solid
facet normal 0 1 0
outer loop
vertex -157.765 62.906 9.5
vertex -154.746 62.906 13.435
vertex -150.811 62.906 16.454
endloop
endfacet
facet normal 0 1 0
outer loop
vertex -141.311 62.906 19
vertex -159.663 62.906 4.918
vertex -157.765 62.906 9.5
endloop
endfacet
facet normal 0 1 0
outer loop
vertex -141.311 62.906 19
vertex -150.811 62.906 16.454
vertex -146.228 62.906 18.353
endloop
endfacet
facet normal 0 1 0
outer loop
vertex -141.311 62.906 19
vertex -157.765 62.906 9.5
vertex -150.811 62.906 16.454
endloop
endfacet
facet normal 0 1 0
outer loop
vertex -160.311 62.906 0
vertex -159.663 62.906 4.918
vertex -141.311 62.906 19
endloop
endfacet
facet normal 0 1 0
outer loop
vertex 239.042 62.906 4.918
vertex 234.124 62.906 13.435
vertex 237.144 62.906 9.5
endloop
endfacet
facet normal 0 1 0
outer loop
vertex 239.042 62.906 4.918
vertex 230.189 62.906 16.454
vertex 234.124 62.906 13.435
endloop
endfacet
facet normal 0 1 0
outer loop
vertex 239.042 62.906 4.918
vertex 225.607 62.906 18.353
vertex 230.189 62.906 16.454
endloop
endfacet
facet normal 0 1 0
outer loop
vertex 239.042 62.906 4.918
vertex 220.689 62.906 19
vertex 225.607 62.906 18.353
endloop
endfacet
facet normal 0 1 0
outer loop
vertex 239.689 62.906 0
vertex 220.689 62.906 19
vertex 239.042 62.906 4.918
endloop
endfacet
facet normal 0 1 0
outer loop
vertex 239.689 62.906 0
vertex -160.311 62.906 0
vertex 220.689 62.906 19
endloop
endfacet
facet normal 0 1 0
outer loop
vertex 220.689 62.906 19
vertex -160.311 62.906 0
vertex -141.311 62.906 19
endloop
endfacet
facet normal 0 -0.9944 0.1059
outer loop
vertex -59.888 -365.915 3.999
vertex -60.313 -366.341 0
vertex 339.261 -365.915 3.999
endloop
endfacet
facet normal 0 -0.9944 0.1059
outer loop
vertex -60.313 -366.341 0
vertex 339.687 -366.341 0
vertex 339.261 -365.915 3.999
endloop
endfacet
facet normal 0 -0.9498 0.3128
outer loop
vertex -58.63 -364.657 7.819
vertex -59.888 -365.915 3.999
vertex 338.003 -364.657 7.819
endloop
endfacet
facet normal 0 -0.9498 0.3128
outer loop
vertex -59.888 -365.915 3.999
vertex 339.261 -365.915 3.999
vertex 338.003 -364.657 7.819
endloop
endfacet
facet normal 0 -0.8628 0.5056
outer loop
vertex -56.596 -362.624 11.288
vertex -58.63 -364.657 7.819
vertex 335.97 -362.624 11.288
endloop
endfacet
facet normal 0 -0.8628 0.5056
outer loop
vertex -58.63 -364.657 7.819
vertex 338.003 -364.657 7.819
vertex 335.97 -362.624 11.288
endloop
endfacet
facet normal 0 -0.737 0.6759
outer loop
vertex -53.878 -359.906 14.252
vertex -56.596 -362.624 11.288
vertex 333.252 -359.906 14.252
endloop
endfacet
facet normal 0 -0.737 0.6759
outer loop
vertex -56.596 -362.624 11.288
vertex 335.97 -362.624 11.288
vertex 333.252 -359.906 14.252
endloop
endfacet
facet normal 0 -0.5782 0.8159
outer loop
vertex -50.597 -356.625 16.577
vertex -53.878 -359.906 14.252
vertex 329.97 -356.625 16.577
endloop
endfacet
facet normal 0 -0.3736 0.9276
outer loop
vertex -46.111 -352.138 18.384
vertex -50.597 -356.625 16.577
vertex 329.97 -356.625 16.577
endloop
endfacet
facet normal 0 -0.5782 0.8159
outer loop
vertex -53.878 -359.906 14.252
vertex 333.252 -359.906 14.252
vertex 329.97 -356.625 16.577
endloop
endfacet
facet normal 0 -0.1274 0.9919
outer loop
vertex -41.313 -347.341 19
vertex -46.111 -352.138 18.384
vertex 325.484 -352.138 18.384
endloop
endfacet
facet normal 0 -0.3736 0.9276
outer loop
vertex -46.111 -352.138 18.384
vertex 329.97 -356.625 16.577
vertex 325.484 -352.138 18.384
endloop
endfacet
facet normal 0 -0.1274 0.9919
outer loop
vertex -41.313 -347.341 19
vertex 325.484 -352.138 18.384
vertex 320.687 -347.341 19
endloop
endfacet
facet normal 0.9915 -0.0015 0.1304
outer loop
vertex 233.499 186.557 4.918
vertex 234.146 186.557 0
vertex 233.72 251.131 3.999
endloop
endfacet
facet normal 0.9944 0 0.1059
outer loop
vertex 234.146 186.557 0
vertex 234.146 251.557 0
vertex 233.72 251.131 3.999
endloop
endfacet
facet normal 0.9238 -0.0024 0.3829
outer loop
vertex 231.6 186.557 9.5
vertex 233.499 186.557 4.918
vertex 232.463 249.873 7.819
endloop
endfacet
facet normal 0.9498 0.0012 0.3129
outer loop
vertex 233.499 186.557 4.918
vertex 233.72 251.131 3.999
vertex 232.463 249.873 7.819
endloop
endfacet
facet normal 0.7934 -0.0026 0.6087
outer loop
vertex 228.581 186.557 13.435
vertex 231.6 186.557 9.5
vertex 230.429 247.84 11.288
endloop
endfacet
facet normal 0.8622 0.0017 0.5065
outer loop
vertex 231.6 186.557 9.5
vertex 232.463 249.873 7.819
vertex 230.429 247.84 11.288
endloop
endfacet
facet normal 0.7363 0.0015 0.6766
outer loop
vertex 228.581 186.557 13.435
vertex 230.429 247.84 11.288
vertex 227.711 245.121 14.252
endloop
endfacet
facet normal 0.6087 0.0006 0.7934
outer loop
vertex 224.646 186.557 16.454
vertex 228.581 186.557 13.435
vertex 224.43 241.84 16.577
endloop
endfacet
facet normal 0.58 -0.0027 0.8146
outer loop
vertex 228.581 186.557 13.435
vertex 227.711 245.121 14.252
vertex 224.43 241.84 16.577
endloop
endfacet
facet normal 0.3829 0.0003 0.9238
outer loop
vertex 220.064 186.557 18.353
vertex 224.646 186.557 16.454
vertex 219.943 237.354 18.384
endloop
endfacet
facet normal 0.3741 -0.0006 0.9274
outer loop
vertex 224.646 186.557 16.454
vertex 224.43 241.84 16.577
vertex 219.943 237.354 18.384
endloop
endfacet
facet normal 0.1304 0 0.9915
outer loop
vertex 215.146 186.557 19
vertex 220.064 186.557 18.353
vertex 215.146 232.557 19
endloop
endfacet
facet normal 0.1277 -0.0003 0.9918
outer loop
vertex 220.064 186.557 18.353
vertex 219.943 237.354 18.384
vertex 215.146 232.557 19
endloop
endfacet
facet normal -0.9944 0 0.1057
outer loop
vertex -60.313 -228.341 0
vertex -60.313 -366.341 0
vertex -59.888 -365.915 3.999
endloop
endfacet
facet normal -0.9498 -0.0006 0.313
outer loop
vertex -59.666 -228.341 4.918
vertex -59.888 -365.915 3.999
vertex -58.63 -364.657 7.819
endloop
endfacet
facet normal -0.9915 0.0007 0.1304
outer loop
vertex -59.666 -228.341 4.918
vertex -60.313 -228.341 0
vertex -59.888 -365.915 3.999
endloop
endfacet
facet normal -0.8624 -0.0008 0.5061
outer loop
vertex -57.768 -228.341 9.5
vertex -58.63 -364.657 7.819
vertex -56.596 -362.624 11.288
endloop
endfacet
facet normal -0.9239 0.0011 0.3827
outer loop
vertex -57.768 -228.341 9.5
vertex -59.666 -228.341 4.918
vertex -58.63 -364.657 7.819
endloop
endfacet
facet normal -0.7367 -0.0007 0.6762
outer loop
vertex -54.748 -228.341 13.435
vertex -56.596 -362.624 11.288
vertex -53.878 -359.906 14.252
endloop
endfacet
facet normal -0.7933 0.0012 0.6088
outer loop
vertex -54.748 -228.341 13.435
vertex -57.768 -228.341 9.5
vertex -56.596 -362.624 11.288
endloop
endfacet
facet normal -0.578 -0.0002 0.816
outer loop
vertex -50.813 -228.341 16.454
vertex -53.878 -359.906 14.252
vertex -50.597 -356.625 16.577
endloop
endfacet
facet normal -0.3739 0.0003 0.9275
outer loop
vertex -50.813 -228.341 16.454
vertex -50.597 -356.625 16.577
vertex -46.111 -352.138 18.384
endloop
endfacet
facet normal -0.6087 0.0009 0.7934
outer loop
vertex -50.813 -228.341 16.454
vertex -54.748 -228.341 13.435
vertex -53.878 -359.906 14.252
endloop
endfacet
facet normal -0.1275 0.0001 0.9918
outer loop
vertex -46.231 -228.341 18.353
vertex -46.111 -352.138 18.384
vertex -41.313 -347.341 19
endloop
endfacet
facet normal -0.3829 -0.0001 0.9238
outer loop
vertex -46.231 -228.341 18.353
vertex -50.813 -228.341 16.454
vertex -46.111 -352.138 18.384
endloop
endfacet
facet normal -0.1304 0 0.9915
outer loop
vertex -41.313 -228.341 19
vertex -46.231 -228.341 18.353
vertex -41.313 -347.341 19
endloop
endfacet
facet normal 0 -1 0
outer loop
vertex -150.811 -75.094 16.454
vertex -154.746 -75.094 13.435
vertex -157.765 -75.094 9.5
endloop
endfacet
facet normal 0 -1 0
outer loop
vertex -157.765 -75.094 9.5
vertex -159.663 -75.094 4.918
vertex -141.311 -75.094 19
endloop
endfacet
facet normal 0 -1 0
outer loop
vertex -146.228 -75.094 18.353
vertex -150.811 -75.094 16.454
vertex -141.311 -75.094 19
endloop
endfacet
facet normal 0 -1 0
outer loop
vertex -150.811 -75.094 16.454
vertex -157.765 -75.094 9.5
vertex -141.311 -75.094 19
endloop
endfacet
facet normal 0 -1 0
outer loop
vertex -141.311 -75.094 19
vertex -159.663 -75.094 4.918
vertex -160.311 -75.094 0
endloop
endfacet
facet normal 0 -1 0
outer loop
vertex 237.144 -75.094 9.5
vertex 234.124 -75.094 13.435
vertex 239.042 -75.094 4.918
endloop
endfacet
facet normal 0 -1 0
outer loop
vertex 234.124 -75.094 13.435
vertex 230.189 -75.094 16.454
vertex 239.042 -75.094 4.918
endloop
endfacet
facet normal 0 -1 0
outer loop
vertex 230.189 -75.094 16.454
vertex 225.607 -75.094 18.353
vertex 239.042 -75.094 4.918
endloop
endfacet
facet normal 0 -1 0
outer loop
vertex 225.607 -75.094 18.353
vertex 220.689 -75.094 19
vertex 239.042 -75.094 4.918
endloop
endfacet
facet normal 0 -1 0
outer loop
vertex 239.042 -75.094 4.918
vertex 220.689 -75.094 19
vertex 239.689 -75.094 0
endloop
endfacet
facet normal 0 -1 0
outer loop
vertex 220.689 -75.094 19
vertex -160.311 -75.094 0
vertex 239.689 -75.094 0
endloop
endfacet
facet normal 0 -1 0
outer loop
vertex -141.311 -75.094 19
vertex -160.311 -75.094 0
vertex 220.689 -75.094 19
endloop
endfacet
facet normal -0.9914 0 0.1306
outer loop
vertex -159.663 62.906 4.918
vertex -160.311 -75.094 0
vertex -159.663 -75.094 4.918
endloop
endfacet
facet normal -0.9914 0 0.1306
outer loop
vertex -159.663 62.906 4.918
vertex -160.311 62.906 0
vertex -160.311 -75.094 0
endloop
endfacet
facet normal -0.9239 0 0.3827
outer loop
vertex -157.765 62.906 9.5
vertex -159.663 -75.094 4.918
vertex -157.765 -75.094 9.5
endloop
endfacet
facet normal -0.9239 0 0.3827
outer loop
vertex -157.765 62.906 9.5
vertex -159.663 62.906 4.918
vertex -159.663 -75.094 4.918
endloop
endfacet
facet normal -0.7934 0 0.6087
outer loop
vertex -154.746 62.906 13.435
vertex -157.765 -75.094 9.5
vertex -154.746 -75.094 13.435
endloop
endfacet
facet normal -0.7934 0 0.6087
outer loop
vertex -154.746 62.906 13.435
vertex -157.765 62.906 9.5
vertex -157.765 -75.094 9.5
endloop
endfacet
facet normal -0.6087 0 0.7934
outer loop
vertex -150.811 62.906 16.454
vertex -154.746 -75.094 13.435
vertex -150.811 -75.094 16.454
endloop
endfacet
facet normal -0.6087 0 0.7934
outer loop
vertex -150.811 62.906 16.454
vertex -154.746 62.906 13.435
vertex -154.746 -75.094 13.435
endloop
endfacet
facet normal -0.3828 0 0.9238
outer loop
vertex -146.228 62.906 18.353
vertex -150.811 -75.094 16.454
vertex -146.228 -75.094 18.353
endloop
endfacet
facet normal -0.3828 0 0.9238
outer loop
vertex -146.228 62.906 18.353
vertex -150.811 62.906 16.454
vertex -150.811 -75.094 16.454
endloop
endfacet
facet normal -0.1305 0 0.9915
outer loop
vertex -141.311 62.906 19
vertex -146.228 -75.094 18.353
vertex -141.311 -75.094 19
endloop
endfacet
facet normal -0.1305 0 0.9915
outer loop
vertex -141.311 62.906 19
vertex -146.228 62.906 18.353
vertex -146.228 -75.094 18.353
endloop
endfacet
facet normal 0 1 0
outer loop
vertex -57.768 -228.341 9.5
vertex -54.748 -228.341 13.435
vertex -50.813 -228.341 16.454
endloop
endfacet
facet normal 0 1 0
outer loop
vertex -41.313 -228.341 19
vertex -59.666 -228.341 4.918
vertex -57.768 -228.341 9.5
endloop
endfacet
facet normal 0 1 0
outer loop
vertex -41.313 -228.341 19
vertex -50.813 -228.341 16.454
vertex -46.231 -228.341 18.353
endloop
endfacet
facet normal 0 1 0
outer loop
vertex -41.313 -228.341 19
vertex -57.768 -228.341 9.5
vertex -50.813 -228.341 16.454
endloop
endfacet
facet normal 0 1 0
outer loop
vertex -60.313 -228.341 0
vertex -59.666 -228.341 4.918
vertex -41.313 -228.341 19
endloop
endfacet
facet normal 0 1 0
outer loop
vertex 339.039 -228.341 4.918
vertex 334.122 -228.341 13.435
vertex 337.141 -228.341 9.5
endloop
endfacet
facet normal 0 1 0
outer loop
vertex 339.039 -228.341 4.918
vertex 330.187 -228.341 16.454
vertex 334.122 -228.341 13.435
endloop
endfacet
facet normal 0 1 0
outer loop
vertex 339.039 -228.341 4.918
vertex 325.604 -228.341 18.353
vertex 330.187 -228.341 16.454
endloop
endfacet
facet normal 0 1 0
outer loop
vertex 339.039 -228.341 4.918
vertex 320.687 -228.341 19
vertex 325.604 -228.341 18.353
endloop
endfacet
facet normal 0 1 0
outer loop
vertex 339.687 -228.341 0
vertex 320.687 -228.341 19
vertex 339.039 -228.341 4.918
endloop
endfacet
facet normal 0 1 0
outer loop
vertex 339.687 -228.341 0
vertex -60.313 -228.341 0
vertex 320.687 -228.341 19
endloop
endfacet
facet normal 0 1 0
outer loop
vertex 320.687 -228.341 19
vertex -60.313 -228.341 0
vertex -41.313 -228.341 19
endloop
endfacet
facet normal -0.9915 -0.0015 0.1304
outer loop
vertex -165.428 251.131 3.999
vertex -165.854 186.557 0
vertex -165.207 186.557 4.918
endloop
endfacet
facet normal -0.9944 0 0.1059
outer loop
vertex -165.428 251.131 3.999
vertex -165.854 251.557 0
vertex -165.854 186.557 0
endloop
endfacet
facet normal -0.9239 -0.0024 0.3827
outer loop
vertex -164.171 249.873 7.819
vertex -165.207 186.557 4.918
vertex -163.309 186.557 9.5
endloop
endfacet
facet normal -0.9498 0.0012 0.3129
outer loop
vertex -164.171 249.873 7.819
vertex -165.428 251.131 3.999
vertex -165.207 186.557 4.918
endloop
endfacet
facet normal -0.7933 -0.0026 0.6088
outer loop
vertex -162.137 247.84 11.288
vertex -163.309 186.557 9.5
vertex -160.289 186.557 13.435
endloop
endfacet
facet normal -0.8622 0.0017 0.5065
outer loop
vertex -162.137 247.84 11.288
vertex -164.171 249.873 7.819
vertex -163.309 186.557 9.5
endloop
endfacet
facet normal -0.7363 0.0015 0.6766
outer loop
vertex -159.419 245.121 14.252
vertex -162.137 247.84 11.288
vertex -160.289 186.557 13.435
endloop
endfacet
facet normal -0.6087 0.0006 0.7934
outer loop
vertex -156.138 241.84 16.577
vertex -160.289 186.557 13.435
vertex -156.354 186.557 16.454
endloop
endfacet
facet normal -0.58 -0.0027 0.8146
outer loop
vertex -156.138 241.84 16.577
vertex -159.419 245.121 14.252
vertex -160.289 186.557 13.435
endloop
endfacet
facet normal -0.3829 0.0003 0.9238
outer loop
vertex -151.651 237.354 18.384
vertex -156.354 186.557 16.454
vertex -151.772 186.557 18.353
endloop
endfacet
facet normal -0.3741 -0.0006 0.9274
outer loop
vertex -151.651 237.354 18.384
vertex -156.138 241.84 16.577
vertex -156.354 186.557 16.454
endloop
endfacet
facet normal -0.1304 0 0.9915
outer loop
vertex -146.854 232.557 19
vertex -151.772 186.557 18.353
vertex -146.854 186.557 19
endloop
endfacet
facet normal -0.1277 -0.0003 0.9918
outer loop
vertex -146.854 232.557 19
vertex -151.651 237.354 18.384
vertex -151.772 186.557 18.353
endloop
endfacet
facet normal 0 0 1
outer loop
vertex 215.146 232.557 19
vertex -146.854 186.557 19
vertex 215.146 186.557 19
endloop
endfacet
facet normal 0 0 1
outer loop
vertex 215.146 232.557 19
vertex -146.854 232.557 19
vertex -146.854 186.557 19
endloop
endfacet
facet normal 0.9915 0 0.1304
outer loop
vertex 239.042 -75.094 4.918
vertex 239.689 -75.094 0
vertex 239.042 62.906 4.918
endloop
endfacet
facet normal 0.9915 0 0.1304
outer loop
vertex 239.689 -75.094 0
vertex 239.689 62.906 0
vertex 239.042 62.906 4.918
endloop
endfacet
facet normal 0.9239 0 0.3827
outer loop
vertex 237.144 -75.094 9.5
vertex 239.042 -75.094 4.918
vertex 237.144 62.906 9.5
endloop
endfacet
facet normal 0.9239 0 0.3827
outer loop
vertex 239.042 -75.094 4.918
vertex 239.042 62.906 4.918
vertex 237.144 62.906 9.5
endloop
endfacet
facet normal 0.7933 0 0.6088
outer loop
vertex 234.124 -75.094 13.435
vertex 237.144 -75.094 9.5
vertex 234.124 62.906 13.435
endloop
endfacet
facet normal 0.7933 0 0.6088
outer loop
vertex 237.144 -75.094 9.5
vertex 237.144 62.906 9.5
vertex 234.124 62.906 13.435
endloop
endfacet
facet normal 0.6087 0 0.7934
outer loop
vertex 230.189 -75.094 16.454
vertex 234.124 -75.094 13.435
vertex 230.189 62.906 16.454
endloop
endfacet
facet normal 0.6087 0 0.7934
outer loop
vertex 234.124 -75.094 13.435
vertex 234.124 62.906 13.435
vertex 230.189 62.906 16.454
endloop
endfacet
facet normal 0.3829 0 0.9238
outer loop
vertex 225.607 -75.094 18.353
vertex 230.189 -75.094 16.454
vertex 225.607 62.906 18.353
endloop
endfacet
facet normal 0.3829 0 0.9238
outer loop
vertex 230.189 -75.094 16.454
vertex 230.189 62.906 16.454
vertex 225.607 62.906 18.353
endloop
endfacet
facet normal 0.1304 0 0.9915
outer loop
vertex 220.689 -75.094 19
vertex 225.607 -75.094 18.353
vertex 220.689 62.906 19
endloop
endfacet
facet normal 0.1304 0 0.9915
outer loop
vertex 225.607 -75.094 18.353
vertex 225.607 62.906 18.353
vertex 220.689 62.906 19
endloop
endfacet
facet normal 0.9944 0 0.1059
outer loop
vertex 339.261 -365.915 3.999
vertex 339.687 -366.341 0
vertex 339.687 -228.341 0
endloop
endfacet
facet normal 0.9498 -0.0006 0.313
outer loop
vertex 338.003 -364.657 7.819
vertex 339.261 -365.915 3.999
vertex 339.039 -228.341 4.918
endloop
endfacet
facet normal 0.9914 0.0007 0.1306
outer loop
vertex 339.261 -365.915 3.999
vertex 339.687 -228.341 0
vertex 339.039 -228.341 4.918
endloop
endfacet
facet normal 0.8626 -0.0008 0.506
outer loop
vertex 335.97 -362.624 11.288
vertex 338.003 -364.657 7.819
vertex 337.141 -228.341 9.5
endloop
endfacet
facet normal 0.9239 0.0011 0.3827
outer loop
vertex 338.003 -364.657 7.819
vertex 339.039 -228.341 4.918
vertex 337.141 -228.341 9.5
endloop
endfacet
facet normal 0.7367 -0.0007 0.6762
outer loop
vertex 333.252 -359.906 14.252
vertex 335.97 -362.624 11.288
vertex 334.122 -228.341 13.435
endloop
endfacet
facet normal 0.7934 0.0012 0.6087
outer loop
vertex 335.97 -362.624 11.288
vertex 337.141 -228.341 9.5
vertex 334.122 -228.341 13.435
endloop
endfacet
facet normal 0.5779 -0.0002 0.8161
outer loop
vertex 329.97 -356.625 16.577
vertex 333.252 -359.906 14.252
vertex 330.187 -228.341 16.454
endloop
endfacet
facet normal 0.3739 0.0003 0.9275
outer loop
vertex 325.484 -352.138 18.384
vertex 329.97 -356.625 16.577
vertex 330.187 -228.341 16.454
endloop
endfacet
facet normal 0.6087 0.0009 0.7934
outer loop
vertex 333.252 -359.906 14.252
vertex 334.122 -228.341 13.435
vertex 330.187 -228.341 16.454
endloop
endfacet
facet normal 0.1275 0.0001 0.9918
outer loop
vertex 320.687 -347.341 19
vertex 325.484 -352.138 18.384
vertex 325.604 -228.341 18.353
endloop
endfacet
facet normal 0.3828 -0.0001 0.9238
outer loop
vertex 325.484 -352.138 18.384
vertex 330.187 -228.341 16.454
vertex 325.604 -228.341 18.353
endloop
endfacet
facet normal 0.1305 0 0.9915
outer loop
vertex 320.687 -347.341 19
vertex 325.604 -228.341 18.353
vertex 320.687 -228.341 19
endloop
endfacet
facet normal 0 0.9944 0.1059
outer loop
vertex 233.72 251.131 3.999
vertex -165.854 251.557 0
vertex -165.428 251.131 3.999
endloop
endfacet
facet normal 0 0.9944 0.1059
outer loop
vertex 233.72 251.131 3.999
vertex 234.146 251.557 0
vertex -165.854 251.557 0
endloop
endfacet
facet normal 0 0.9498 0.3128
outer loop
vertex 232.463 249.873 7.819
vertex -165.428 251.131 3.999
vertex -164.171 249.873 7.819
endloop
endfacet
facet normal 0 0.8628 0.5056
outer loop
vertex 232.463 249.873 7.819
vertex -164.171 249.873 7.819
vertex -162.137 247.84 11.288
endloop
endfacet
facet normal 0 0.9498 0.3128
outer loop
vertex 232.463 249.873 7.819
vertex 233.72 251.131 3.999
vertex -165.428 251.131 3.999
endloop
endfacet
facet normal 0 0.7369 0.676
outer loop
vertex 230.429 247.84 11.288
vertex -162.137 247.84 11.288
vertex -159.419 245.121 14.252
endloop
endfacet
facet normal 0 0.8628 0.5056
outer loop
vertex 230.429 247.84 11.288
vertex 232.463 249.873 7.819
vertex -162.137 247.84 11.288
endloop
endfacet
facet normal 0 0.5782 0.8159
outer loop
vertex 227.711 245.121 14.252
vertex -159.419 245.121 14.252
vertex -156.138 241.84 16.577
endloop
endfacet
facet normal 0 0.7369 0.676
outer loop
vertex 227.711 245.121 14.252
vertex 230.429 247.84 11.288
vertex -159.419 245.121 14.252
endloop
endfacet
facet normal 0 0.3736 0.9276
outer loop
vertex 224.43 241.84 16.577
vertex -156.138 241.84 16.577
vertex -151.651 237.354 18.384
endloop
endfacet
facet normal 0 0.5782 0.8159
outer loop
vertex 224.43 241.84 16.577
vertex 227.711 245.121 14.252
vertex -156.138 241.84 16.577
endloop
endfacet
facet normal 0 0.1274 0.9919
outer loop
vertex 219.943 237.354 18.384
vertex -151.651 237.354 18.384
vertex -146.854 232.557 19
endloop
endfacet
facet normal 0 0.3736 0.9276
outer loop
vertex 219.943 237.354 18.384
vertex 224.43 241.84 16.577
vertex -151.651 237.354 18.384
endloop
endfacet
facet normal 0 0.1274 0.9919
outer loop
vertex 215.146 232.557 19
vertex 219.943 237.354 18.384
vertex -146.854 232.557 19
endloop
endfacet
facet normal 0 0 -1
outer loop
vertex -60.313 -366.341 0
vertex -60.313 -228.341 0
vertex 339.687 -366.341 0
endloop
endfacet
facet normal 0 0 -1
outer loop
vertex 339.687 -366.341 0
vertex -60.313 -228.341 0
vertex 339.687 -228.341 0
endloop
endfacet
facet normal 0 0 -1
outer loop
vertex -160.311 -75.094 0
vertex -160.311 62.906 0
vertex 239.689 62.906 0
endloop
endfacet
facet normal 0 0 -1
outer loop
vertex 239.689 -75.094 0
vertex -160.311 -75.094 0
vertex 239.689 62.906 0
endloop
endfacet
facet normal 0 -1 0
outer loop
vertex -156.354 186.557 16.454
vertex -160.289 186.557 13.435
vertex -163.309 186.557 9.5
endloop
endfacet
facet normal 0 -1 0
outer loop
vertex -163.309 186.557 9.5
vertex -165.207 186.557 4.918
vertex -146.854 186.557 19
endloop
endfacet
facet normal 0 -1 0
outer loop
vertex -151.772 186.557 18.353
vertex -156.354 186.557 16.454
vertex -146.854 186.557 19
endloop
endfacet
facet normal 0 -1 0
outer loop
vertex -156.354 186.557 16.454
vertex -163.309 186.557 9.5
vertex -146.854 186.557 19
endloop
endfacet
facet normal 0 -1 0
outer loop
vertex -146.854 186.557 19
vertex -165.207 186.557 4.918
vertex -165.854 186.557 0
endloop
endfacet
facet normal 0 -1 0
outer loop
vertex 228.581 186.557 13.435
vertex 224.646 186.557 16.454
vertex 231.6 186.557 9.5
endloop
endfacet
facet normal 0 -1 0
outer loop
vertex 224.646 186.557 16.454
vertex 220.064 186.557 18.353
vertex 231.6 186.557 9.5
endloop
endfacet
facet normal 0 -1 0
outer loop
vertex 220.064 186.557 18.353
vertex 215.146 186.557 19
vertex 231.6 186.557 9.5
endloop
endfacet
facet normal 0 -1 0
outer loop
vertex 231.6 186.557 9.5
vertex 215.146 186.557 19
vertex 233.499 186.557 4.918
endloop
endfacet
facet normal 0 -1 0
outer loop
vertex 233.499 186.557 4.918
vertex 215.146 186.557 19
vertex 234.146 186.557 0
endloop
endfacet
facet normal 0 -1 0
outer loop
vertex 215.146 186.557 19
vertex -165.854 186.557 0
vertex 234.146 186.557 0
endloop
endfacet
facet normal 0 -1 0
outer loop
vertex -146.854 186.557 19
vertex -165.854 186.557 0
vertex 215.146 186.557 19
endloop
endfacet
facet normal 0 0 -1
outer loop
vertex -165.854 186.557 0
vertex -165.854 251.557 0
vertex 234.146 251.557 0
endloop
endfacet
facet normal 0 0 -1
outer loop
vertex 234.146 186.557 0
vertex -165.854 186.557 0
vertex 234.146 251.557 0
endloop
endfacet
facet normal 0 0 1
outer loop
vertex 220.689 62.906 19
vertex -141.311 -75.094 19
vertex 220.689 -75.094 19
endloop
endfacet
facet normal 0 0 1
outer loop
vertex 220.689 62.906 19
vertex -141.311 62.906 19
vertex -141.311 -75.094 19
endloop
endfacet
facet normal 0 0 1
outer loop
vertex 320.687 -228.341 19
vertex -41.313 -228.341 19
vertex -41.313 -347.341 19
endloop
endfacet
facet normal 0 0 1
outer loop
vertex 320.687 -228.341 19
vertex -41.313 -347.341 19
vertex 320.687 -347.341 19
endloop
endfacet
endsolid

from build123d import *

# Parameters (mm, degrees)
F2_W     = 400
F2_H     = 65
F3_DEPTH = 19
F0_W     = 400
F0_H     = 138
F4_DEPTH = 19
F1_W     = 400
F1_H     = 138
F5_DEPTH = 19
F6_R     = 18.99999
F6_2_R   = 18.99999
F6_3_R   = 18.99999


# Not quite as in the source:
# - a fillet or chamfer is up to 0.001 mm smaller than in the source, because OpenCascade refuses the exact size


with BuildPart() as f3:
    # F2 (on Top) → F3 (new body)
    with BuildSketch(Plane.XY):
        with Locations((34.1459533652, 219.0565094352)):
            Rectangle(F2_W, F2_H)
    extrude(amount=F3_DEPTH)

    # F6#3 (radius 19 in the source; OpenCascade refuses exactly that, so slightly less here)
    f6_3_edges = [f3.edges().sort_by_distance(p)[0] for p in [
        (234.145953, 219.056509, 19),
        (34.145953, 251.556509, 19),
        (-165.854047, 219.056509, 19),
    ]]
    fillet(f6_3_edges, radius=F6_3_R)


with BuildPart() as f4:
    # F0 (on Top) → F4 (new body)
    with BuildSketch(Plane.XY):
        with Locations((39.6892666308, -6.0938838869)):
            Rectangle(F0_W, F0_H)
    extrude(amount=F4_DEPTH)

    # F6#2 (radius 19 in the source; OpenCascade refuses exactly that, so slightly less here)
    f6_2_edges = [f4.edges().sort_by_distance(p)[0] for p in [
        (-160.310733, -6.093884, 19),
        (239.689267, -6.093884, 19),
    ]]
    fillet(f6_2_edges, radius=F6_2_R)


with BuildPart() as f5:
    # F1 (on Top) → F5 (new body)
    with BuildSketch(Plane.XY):
        with Locations((139.6866820736, -297.3407134414)):
            Rectangle(F1_W, F1_H)
    extrude(amount=F5_DEPTH)

    # F6 (radius 19 in the source; OpenCascade refuses exactly that, so slightly less here)
    f6_edges = [f5.edges().sort_by_distance(p)[0] for p in [
        (139.686682, -366.340713, 19),
        (-60.313318, -297.340713, 19),
        (339.686682, -297.340713, 19),
    ]]
    fillet(f6_edges, radius=F6_R)


solid = Compound([f3.part, f4.part, f5.part])
